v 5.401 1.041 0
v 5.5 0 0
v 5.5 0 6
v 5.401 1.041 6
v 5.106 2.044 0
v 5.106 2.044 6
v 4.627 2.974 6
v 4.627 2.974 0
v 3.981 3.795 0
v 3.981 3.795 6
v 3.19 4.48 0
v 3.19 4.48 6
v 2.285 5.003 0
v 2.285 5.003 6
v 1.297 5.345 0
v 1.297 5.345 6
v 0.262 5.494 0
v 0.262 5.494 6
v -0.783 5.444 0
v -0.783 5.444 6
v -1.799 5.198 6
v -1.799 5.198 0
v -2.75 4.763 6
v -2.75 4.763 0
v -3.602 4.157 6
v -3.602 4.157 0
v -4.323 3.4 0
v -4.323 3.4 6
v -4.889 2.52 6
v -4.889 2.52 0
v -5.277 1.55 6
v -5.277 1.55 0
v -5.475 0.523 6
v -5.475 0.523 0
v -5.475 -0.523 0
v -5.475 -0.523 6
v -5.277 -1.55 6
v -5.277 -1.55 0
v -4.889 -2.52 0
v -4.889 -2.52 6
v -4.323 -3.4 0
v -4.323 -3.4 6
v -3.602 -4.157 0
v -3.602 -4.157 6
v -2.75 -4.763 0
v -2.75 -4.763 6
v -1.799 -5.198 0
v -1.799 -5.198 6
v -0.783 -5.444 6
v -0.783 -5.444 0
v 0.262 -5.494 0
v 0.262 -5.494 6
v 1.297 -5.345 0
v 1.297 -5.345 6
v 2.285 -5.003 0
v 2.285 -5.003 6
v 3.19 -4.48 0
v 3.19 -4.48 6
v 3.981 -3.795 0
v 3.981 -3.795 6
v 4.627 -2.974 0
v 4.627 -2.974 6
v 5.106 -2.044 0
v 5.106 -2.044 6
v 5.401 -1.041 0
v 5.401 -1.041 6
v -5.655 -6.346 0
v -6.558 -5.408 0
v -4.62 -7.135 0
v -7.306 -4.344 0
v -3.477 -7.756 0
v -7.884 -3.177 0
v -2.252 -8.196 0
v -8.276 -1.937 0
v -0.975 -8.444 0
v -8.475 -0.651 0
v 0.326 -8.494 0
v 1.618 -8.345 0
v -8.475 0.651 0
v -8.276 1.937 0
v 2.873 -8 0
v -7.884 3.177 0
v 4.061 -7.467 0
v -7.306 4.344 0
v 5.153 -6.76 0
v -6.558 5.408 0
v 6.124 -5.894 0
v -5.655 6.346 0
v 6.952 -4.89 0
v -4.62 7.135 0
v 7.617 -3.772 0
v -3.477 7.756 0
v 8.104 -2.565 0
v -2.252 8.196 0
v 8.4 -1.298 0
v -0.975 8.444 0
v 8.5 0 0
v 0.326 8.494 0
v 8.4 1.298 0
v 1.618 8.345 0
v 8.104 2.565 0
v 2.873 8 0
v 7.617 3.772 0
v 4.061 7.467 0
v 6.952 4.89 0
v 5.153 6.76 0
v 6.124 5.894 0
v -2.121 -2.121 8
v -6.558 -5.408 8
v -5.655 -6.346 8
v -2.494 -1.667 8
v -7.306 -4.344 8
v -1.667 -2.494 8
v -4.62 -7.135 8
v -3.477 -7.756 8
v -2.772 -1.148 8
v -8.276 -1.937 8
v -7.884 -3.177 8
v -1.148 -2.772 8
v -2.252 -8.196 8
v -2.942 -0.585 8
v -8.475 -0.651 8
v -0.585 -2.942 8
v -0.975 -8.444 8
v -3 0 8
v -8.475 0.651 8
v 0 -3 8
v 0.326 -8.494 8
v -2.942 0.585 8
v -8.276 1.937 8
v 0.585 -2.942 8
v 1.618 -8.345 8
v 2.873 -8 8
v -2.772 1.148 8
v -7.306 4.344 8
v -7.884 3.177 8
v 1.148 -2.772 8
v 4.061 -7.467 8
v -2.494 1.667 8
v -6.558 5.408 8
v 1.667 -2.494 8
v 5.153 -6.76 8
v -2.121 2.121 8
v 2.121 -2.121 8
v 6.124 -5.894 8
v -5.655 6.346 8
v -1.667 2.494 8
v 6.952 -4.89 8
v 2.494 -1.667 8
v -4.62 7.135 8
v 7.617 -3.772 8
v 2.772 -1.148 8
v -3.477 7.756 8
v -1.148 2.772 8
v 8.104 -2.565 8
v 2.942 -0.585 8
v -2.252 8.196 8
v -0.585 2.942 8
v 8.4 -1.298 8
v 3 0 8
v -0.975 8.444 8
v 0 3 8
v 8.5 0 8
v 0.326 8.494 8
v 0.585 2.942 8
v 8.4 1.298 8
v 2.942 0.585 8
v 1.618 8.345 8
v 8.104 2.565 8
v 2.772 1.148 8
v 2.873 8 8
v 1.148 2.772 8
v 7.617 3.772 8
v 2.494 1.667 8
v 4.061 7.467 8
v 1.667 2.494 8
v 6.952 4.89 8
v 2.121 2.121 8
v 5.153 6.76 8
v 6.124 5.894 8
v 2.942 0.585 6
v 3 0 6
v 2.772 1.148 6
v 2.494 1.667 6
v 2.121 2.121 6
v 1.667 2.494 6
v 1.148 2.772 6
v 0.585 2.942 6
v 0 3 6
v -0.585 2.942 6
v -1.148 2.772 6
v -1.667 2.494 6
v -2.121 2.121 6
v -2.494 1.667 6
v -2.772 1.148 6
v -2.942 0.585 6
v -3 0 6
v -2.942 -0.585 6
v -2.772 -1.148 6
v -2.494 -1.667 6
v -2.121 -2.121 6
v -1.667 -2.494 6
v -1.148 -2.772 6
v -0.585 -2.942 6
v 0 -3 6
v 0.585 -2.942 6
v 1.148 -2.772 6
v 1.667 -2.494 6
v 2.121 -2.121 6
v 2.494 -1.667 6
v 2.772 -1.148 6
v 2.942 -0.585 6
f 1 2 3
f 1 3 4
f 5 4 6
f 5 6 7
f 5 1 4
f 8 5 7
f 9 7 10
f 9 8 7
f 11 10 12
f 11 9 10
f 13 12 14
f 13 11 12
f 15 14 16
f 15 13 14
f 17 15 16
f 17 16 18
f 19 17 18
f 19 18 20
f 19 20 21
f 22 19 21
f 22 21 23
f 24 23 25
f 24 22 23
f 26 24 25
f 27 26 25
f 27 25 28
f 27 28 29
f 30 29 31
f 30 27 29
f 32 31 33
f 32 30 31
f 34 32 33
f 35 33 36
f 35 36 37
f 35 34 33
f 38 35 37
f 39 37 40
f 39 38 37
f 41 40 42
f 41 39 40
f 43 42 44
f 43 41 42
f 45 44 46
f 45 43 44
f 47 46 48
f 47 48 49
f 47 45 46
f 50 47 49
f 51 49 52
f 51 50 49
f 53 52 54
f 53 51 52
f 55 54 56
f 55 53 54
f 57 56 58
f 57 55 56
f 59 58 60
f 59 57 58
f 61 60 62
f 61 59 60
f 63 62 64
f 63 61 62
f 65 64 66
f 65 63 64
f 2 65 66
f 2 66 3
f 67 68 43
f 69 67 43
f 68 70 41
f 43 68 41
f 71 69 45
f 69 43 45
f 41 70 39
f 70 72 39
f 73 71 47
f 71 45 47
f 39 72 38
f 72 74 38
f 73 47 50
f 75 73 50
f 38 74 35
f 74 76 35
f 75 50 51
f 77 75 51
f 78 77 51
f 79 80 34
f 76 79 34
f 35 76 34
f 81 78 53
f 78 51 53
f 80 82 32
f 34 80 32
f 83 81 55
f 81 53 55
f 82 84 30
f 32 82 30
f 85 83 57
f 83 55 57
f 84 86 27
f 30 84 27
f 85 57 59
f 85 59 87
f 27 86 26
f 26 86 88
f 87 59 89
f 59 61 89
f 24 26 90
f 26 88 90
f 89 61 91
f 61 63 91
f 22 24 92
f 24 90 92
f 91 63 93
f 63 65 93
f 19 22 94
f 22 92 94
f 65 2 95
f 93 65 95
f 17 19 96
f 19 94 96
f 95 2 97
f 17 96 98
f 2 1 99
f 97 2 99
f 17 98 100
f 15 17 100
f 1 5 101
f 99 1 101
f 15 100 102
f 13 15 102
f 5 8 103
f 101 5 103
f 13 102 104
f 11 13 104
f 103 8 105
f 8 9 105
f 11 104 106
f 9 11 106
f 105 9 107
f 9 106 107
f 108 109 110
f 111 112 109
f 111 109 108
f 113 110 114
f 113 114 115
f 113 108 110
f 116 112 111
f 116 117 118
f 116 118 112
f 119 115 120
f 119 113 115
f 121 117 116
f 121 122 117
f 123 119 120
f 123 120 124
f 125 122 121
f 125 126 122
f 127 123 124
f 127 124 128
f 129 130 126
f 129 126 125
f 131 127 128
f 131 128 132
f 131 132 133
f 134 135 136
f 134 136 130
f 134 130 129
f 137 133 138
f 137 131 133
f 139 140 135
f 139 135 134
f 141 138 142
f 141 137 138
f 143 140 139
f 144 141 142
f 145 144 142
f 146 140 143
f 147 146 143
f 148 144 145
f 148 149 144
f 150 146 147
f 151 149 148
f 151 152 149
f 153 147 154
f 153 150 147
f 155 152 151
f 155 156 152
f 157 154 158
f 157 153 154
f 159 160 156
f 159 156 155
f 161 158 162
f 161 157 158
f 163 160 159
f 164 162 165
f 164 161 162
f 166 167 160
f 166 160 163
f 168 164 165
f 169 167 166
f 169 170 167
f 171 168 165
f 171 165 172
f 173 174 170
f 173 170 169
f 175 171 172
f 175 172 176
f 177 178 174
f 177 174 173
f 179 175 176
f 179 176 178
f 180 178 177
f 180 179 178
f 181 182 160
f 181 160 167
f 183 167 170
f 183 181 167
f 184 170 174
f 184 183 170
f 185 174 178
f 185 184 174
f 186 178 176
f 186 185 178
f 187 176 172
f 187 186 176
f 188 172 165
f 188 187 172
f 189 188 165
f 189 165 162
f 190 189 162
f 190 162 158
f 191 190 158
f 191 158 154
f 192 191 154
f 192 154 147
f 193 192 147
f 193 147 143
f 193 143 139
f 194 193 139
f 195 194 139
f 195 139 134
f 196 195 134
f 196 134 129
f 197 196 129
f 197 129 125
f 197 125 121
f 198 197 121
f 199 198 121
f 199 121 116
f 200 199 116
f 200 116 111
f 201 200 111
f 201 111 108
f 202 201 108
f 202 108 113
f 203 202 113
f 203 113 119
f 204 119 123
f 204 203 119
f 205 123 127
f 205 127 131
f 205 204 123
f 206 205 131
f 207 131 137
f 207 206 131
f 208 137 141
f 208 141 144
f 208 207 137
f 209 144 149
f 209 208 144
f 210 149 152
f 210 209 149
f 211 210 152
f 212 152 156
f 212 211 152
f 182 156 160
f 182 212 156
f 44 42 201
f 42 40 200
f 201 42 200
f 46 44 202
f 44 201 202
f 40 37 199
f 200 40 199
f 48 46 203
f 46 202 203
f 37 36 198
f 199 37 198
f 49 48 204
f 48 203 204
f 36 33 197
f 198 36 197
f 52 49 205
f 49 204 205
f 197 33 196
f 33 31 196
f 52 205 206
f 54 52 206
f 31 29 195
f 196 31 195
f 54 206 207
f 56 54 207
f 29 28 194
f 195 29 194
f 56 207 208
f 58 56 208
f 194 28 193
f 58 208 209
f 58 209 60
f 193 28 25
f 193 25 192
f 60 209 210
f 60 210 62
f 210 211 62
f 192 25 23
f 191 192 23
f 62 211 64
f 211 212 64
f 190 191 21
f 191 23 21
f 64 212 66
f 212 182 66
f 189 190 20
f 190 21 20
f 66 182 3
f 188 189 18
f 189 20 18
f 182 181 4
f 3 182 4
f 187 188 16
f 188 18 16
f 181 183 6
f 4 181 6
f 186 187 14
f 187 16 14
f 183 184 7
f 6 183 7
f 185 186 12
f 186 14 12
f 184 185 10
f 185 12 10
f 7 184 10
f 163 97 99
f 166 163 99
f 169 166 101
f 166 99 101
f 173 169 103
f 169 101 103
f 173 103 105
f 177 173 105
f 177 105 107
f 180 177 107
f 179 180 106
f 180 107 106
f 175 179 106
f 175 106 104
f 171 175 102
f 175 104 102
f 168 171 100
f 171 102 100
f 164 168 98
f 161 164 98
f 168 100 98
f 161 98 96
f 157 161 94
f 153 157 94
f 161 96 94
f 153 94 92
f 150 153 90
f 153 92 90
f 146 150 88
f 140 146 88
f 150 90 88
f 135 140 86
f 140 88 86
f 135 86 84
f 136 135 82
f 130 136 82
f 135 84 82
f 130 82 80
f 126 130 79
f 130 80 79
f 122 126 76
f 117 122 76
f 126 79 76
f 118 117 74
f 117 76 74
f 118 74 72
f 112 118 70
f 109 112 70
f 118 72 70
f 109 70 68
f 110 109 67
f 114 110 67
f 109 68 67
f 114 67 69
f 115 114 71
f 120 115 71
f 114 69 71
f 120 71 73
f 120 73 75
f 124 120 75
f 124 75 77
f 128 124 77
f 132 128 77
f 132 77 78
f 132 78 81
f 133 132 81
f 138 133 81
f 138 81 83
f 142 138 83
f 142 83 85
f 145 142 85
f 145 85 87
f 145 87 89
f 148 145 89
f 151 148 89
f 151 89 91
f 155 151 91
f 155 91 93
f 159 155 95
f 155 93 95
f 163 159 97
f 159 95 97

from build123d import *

# Parameters (mm, degrees)
F0_R     = 8.5
F0_R_2   = 5.5
F1_DEPTH = 8
F0_R_3   = 3
F2_DEPTH = 8
F3_DEPTH = 6


with BuildPart() as f1:
    # F0 (on Top) → F1 (new body)
    with BuildSketch(Plane.XY):
        Circle(F0_R)
        Circle(F0_R_2, mode=Mode.SUBTRACT)
    extrude(amount=F1_DEPTH)

    # F0 (on Top) → F2 (join)
    with BuildSketch(Plane.XY):
        Circle(F0_R_2)
        Circle(F0_R_3, mode=Mode.SUBTRACT)
    extrude(amount=F2_DEPTH)

    # F0 (on Top) → F3 (cut)
    with BuildSketch(Plane.XY):
        Circle(F0_R_2)
        Circle(F0_R_3, mode=Mode.SUBTRACT)
    extrude(amount=F3_DEPTH, mode=Mode.SUBTRACT)


solid = f1.part
